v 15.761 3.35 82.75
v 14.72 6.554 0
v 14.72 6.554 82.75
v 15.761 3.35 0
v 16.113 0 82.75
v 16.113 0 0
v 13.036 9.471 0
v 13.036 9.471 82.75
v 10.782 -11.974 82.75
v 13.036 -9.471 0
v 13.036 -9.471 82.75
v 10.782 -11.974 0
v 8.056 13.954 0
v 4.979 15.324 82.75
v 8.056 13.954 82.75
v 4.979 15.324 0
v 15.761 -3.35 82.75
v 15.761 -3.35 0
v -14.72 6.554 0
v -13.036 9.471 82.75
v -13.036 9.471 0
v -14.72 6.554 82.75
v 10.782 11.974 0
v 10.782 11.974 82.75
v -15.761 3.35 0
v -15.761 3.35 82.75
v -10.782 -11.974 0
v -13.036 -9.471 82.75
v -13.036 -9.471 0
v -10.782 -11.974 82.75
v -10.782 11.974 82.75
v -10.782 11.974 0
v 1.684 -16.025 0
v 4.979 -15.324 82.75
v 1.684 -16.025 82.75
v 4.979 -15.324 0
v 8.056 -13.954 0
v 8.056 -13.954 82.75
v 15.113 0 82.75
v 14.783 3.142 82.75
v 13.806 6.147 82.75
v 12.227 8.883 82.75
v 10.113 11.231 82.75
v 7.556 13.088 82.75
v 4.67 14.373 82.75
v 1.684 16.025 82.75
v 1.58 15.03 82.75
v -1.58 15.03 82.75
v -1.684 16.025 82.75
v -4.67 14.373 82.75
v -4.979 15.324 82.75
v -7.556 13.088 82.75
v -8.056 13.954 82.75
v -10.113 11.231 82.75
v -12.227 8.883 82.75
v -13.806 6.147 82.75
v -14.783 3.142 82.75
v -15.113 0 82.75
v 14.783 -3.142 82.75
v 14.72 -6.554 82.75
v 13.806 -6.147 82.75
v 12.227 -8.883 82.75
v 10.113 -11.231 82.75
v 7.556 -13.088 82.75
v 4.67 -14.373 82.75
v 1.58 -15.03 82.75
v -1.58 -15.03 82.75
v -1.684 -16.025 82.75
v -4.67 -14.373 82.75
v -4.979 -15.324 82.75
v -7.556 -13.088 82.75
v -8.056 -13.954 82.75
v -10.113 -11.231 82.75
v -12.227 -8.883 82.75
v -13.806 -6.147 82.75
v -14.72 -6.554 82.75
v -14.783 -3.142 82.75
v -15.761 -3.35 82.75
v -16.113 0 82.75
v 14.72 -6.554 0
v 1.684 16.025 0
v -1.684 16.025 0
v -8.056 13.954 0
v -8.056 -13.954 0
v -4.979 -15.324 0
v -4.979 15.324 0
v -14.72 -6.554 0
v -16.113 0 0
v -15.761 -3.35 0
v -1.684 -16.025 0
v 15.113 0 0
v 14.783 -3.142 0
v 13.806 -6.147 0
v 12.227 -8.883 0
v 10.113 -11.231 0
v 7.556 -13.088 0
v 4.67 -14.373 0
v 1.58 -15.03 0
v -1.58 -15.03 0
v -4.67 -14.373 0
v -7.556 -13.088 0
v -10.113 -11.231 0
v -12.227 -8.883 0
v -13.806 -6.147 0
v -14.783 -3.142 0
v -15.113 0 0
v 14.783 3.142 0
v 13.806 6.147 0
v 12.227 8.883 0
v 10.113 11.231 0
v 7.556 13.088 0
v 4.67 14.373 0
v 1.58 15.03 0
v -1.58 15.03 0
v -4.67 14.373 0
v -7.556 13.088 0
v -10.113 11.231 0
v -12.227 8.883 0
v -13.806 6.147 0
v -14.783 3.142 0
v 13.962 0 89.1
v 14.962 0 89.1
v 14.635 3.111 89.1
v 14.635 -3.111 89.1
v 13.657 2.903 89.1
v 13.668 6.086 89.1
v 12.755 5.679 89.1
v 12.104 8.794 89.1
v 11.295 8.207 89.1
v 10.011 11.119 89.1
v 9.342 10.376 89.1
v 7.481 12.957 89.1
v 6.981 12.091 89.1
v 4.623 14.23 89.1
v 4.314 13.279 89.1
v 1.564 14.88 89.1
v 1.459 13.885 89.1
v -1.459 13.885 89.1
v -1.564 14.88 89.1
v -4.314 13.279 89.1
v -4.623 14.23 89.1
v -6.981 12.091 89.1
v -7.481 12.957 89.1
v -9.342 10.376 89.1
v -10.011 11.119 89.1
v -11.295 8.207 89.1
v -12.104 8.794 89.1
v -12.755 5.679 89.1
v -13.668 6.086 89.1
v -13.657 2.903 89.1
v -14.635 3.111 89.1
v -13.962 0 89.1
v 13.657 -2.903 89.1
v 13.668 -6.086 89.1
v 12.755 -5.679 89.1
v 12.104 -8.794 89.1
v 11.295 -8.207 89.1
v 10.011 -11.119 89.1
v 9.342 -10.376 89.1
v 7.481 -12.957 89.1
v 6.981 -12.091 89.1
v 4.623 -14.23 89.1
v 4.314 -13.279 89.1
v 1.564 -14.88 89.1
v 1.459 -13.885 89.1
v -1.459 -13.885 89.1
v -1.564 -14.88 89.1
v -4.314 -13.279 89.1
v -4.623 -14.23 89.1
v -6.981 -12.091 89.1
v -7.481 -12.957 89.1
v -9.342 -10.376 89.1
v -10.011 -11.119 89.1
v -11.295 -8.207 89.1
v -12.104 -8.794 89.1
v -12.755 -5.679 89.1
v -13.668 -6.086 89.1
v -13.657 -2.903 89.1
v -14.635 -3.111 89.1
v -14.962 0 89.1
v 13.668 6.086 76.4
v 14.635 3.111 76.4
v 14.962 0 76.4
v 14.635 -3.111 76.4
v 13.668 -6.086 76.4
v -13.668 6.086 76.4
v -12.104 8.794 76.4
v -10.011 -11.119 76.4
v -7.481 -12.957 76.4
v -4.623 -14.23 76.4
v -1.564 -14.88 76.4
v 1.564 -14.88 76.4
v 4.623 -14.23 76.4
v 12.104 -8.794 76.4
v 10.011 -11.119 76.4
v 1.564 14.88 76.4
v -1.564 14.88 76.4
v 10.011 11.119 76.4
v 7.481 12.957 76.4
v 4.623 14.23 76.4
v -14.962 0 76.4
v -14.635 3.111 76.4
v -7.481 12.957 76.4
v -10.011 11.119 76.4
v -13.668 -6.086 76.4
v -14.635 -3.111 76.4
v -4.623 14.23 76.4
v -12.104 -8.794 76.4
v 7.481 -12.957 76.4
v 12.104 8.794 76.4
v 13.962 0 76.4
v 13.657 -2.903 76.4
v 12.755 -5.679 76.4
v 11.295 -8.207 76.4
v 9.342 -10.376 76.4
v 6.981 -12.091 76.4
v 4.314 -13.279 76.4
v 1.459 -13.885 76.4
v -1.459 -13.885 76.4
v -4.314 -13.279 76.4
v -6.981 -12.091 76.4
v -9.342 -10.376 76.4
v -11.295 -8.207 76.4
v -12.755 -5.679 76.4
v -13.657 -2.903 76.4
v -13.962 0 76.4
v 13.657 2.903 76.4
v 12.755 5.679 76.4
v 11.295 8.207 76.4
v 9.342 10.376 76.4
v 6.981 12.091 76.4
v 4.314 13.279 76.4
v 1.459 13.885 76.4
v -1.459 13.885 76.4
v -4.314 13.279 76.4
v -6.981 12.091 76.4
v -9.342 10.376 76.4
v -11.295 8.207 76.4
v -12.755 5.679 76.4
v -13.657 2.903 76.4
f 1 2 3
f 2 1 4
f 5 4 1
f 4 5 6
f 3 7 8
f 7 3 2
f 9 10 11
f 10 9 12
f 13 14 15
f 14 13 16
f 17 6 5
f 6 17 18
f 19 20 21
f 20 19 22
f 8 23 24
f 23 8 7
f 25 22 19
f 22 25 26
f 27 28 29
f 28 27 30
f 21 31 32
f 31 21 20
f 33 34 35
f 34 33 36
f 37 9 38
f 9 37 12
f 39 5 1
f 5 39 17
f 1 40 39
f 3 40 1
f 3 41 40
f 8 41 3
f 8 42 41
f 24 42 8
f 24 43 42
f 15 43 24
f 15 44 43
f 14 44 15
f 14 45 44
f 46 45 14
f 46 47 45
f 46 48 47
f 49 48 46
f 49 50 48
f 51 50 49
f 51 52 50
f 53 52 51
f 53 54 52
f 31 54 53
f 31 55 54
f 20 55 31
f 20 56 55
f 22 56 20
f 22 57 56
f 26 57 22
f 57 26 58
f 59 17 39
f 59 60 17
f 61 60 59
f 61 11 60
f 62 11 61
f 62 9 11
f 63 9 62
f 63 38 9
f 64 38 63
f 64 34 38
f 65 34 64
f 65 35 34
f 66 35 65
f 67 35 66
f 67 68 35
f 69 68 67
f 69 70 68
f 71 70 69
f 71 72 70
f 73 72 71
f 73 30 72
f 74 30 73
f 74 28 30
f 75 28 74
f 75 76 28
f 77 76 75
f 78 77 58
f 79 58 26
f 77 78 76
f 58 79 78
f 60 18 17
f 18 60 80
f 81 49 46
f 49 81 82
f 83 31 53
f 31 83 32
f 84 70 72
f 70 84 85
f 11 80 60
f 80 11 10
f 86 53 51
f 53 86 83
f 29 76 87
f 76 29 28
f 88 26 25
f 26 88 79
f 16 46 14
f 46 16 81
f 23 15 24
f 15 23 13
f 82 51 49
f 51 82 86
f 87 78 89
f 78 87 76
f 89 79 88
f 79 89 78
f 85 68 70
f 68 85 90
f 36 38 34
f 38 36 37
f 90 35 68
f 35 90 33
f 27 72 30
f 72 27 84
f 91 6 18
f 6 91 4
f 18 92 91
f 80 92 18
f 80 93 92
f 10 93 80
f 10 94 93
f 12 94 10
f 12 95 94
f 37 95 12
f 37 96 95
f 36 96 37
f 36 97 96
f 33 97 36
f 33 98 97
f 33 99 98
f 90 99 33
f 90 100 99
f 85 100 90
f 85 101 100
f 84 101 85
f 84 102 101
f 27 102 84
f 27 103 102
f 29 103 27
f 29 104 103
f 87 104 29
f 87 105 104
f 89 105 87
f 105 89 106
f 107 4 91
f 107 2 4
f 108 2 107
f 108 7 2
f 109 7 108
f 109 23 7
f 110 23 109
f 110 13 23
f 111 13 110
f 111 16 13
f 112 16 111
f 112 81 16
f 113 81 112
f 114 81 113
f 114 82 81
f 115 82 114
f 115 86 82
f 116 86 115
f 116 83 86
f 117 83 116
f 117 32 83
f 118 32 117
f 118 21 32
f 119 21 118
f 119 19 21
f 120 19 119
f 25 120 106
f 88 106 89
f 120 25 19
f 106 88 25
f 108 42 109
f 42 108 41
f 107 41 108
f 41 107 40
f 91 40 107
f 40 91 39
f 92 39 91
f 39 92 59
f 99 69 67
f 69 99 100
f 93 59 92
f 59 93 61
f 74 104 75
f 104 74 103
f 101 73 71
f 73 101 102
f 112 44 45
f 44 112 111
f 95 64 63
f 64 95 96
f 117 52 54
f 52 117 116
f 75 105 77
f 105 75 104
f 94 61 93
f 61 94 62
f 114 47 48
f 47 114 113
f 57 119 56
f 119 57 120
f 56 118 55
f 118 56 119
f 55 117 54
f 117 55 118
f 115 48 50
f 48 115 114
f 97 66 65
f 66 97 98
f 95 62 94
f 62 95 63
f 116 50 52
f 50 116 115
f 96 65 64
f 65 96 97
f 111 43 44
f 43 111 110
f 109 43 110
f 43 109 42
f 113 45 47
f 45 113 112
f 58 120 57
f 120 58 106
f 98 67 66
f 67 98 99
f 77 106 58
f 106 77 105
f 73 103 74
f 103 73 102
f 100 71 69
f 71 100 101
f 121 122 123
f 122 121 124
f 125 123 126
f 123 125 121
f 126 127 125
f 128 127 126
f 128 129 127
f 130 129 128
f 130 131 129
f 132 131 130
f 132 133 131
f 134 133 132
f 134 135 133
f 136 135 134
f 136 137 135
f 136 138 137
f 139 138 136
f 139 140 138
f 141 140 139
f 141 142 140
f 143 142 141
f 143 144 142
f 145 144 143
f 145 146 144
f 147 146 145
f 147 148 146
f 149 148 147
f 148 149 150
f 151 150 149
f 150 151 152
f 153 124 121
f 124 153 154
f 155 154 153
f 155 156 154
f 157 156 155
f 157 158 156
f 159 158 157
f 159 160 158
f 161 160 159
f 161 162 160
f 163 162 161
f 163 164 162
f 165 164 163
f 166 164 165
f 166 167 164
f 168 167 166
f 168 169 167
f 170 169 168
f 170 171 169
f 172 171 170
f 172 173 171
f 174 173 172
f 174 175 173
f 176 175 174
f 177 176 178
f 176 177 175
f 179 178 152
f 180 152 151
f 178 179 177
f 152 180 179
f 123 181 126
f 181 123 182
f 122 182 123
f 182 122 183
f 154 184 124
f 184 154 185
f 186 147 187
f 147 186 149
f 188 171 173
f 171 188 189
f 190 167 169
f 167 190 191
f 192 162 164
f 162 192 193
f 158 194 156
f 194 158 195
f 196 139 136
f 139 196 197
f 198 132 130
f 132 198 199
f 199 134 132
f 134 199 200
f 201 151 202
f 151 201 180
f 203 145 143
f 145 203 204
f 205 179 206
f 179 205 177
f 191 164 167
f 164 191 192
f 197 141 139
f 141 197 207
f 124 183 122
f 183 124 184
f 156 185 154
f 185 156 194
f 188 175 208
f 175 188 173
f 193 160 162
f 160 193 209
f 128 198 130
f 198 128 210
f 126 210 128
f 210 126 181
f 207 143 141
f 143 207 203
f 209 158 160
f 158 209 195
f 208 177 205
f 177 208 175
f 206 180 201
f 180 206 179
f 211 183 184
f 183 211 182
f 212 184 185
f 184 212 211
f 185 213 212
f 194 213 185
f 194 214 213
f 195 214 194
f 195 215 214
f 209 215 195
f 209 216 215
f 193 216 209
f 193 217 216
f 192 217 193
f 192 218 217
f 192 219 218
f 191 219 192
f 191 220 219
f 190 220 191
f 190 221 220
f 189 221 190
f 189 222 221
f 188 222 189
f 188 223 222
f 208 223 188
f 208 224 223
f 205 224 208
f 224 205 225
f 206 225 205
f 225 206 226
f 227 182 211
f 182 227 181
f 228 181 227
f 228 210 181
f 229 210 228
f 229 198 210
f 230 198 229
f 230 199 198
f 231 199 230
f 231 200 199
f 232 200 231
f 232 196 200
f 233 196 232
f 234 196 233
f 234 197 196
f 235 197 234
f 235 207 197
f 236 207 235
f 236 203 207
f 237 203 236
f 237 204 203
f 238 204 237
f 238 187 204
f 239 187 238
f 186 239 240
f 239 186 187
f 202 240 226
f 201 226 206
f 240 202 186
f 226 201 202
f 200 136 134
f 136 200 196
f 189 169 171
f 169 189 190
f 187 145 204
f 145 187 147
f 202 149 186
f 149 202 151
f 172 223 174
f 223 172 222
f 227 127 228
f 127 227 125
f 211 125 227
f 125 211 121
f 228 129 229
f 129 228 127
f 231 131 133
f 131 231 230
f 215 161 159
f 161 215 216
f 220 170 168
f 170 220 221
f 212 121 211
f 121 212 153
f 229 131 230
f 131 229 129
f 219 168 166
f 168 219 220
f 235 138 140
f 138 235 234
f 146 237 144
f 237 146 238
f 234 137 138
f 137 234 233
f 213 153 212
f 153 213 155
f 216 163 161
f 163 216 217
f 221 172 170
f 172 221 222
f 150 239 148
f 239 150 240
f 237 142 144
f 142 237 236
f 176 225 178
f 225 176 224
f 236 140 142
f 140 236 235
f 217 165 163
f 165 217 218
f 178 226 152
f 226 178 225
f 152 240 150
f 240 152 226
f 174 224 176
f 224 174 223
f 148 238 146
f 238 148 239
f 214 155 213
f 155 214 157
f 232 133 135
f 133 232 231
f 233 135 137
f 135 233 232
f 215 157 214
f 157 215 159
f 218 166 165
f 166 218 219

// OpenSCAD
// file: rockit.scad
// Rockit - Model Rocket Construction Kit
//
// Giles Hall (C) 2012,2013
//
// Tail fin code based on:
// - Lutz Paelke (lpaelke) - http://www.thingiverse.com/thing:26508/

function in2mm(in) = in / 0.0393701;


/////////////////
// Rocket Parts
// Some of these are mutually exclusive
engine_holder_enabled = 0;
body_enabled = 0;
fins_enabled = 0;
collar_enabled = 0;
guide_enabled = 0;
nosecone_enabled = 0;

/////////////////
// Engine Dimensions
// http://www2.estesrockets.com/pdf/Estes_Model_Rocket_Engines.pdf
// mini engine
mini_engine_pad = 0.2;
mini_engine_gap = in2mm(.5);
mini_engine_length = in2mm(1.75);
mini_engine_dia = in2mm(.5);
// standard engine
standard_engine_pad = 0.2;
standard_engine_gap = in2mm(.5);
standard_engine_length = in2mm(2.75);
standard_engine_dia = in2mm(.69);
// D engine
d_engine_pad = 0.2;
d_engine_gap = in2mm(1);
d_engine_length = in2mm(2.75);
d_engine_dia = in2mm(.95);
// E engine
e_engine_pad = 0.2;
e_engine_gap = in2mm(.5);
e_engine_length = in2mm(3.75);
e_engine_dia = in2mm(.95);
// engine selection
engine_length = standard_engine_length;
engine_dia = standard_engine_dia;
engine_gap = standard_engine_gap;
engine_pad = standard_engine_pad;

/////////////////
// Global
wall_thickness = 2;
collar_height = in2mm(.25);

/////////////////
// Engine Holder
engine_holder_overhang = 20;
engine_holder_inner_dia = engine_dia + engine_pad;
engine_holder_outer_dia = engine_dia + wall_thickness;
engine_holder_length = engine_length + engine_pad;
engine_holder_offset = collar_height;
engine_holder_firewall_length = in2mm(.25);

/////////////////
// Body
//body_height = engine_holder_length + engine_holder_offset + engine_holder_offset + in2mm(.2);
body_height = engine_holder_length + engine_holder_offset + engine_holder_offset;
body_inner_dia = engine_dia + engine_gap;
body_outer_dia = body_inner_dia + wall_thickness;

/////////////////
// Fins
fin_count = 6;
fin_span = body_outer_dia * 3.5;
fin_thickness = wall_thickness;
fin_endchord = body_height * .6;
fin_sym_flag = 1;
//fin_offset = fin_endchord;
fin_offset = 0;
fin_coverage = .99;
fin_height = (body_height - fin_offset) * fin_coverage;

/////////////////
// Collar
collar_overlap = collar_height;
collar_fit = .990;
collar_outer_dia = body_inner_dia * collar_fit;
collar_inner_dia = collar_outer_dia - wall_thickness;

/////////////////
// Guide
guide_inner_dia = 4.6;
guide_outer_dia = guide_inner_dia + 1;
guide_height = in2mm(2);
guide_offset = in2mm(.5);

/////////////////
// Nosecone
nosecone_height = body_height;
nosecone_inner_dia = body_inner_dia;
nosecone_outer_dia = body_outer_dia;

/////////////////
// Quality
circle_segments = 30;

module fin(angle, deflection)
{
    translate([0,0,fin_offset])
    rotate([0,0,angle])
        polyhedron(points=[
        // inner-bottom
        [body_inner_dia / 2, fin_thickness / 2 + deflection, 0], 
        [body_inner_dia / 2, -fin_thickness / 2 + deflection, 0],
        // outer-bottom
        [fin_span / 2, fin_thickness / 2 + deflection, fin_sym_flag ? -fin_endchord : 0], 
        [fin_span / 2, -fin_thickness / 2 + deflection, fin_sym_flag ? -fin_endchord : 0],
        // outer-top
        [fin_span / 2, fin_thickness / 2 - deflection, fin_height - fin_endchord], 
        [fin_span / 2, -fin_thickness / 2 - deflection, fin_height - fin_endchord],
        // inner-top
        [body_inner_dia / 2, fin_thickness / 2 - deflection, fin_height],
        [body_inner_dia / 2, -fin_thickness / 2 - deflection, fin_height]],
        triangles=[[0, 1, 2],  [1, 3, 2], 
                    [2, 3, 4],  [3, 5, 4], 
                    [4, 5, 6],  [5, 7, 6], 
                    [6, 7, 0],  [7, 1, 0], 
                    [0, 2, 6],  [2, 4, 6], 
                    [1, 7, 3],  [3, 7, 5]]);
}

module tube(name, length, outer_dia, inner_dia)
{
    echo(str("Tube [", name, "]: ", length, "mm len, ", outer_dia, "mm OD, ", inner_dia, "mm ID"));
    difference()
    {
        // outer
        cylinder(h=length, r=outer_dia / 2, $fn=circle_segments);
        // inner
        cylinder(h=length, r=inner_dia / 2, $fn=circle_segments);
    }
}

module tube2(name, length, outer_dia1, inner_dia1, outer_dia2, inner_dia2)
{
    echo(str("Tube2 [", name, "]: ", length, "mm len, ", outer_dia1, "mm OD1, ", inner_dia1, "mm ID1", outer_dia2, "mm OD2, ", inner_dia2, "mm ID2"));
    difference()
    {
        // outer
        cylinder(h=length, r1=outer_dia1 / 2, r2=outer_dia2 / 2, $fn=circle_segments);
        // inner
        cylinder(h=length, r1=inner_dia1 / 2, r2=inner_dia2 / 2, $fn=circle_segments);
    }
}

module make_guide() 
{
    if (guide_enabled)
    {
        echo(str("Making guide"));
		rotate([0, 0, 180 / fin_count]) 
        translate([body_outer_dia / 2 + guide_inner_dia / 2, 0, guide_offset])
        tube("guide", guide_height, guide_outer_dia, guide_inner_dia);
    }
}

module make_fins() 
{
    if (fins_enabled)
    {
        echo(str("Making fins"));
		for (i = [0:fin_count - 1])
        {
            fin(i * (360 / fin_count), 0);
        }
    }
}

module make_collar()
{
    if (collar_enabled)
    {
        echo(str("Making collar"));
        translate([0, 0, body_height - collar_overlap]) 
        tube("collar", collar_height + collar_overlap, collar_outer_dia, collar_inner_dia);
    }
}

module make_engine_holder()
{
    if (engine_holder_enabled)
    {
        echo(str("Making engine holder"));
        union()
        {
            // engine offset
            translate([0, 0, engine_holder_offset * 2])
            tube("engine tube", engine_holder_length, engine_holder_outer_dia, engine_holder_inner_dia);
            // engine collar
            translate([0, 0, engine_holder_offset])
            tube2("engine tube", engine_holder_offset, body_outer_dia, body_inner_dia, engine_holder_outer_dia, engine_holder_inner_dia);
            // engine firewall
            translate([0, 0, engine_holder_offset + engine_holder_length])
            tube("engine firewall", engine_holder_firewall_length, body_outer_dia, engine_holder_inner_dia);
        }
    }
}

module make_body()
{
    if (body_enabled)
    {
        echo(str("Making body"));
        tube("body", body_height, body_outer_dia, body_inner_dia);
    }
}

module make_nosecone()
{
    if (nosecone_enabled)
    {
        echo(str("Making nosecone"));
        tube("nosecone", nosecone_height, nosecone_inner_dia, nosecone_outer_dia);
    }
}

module make_rockit()
{
    union()
    {
        make_body();
        make_collar();
        make_guide();
        make_fins();
        make_engine_holder();
        make_nosecone();
    }
}
// main file
include <rockit.scad>;
collar_enabled = 1;
body_enabled = 1;
make_rockit();
